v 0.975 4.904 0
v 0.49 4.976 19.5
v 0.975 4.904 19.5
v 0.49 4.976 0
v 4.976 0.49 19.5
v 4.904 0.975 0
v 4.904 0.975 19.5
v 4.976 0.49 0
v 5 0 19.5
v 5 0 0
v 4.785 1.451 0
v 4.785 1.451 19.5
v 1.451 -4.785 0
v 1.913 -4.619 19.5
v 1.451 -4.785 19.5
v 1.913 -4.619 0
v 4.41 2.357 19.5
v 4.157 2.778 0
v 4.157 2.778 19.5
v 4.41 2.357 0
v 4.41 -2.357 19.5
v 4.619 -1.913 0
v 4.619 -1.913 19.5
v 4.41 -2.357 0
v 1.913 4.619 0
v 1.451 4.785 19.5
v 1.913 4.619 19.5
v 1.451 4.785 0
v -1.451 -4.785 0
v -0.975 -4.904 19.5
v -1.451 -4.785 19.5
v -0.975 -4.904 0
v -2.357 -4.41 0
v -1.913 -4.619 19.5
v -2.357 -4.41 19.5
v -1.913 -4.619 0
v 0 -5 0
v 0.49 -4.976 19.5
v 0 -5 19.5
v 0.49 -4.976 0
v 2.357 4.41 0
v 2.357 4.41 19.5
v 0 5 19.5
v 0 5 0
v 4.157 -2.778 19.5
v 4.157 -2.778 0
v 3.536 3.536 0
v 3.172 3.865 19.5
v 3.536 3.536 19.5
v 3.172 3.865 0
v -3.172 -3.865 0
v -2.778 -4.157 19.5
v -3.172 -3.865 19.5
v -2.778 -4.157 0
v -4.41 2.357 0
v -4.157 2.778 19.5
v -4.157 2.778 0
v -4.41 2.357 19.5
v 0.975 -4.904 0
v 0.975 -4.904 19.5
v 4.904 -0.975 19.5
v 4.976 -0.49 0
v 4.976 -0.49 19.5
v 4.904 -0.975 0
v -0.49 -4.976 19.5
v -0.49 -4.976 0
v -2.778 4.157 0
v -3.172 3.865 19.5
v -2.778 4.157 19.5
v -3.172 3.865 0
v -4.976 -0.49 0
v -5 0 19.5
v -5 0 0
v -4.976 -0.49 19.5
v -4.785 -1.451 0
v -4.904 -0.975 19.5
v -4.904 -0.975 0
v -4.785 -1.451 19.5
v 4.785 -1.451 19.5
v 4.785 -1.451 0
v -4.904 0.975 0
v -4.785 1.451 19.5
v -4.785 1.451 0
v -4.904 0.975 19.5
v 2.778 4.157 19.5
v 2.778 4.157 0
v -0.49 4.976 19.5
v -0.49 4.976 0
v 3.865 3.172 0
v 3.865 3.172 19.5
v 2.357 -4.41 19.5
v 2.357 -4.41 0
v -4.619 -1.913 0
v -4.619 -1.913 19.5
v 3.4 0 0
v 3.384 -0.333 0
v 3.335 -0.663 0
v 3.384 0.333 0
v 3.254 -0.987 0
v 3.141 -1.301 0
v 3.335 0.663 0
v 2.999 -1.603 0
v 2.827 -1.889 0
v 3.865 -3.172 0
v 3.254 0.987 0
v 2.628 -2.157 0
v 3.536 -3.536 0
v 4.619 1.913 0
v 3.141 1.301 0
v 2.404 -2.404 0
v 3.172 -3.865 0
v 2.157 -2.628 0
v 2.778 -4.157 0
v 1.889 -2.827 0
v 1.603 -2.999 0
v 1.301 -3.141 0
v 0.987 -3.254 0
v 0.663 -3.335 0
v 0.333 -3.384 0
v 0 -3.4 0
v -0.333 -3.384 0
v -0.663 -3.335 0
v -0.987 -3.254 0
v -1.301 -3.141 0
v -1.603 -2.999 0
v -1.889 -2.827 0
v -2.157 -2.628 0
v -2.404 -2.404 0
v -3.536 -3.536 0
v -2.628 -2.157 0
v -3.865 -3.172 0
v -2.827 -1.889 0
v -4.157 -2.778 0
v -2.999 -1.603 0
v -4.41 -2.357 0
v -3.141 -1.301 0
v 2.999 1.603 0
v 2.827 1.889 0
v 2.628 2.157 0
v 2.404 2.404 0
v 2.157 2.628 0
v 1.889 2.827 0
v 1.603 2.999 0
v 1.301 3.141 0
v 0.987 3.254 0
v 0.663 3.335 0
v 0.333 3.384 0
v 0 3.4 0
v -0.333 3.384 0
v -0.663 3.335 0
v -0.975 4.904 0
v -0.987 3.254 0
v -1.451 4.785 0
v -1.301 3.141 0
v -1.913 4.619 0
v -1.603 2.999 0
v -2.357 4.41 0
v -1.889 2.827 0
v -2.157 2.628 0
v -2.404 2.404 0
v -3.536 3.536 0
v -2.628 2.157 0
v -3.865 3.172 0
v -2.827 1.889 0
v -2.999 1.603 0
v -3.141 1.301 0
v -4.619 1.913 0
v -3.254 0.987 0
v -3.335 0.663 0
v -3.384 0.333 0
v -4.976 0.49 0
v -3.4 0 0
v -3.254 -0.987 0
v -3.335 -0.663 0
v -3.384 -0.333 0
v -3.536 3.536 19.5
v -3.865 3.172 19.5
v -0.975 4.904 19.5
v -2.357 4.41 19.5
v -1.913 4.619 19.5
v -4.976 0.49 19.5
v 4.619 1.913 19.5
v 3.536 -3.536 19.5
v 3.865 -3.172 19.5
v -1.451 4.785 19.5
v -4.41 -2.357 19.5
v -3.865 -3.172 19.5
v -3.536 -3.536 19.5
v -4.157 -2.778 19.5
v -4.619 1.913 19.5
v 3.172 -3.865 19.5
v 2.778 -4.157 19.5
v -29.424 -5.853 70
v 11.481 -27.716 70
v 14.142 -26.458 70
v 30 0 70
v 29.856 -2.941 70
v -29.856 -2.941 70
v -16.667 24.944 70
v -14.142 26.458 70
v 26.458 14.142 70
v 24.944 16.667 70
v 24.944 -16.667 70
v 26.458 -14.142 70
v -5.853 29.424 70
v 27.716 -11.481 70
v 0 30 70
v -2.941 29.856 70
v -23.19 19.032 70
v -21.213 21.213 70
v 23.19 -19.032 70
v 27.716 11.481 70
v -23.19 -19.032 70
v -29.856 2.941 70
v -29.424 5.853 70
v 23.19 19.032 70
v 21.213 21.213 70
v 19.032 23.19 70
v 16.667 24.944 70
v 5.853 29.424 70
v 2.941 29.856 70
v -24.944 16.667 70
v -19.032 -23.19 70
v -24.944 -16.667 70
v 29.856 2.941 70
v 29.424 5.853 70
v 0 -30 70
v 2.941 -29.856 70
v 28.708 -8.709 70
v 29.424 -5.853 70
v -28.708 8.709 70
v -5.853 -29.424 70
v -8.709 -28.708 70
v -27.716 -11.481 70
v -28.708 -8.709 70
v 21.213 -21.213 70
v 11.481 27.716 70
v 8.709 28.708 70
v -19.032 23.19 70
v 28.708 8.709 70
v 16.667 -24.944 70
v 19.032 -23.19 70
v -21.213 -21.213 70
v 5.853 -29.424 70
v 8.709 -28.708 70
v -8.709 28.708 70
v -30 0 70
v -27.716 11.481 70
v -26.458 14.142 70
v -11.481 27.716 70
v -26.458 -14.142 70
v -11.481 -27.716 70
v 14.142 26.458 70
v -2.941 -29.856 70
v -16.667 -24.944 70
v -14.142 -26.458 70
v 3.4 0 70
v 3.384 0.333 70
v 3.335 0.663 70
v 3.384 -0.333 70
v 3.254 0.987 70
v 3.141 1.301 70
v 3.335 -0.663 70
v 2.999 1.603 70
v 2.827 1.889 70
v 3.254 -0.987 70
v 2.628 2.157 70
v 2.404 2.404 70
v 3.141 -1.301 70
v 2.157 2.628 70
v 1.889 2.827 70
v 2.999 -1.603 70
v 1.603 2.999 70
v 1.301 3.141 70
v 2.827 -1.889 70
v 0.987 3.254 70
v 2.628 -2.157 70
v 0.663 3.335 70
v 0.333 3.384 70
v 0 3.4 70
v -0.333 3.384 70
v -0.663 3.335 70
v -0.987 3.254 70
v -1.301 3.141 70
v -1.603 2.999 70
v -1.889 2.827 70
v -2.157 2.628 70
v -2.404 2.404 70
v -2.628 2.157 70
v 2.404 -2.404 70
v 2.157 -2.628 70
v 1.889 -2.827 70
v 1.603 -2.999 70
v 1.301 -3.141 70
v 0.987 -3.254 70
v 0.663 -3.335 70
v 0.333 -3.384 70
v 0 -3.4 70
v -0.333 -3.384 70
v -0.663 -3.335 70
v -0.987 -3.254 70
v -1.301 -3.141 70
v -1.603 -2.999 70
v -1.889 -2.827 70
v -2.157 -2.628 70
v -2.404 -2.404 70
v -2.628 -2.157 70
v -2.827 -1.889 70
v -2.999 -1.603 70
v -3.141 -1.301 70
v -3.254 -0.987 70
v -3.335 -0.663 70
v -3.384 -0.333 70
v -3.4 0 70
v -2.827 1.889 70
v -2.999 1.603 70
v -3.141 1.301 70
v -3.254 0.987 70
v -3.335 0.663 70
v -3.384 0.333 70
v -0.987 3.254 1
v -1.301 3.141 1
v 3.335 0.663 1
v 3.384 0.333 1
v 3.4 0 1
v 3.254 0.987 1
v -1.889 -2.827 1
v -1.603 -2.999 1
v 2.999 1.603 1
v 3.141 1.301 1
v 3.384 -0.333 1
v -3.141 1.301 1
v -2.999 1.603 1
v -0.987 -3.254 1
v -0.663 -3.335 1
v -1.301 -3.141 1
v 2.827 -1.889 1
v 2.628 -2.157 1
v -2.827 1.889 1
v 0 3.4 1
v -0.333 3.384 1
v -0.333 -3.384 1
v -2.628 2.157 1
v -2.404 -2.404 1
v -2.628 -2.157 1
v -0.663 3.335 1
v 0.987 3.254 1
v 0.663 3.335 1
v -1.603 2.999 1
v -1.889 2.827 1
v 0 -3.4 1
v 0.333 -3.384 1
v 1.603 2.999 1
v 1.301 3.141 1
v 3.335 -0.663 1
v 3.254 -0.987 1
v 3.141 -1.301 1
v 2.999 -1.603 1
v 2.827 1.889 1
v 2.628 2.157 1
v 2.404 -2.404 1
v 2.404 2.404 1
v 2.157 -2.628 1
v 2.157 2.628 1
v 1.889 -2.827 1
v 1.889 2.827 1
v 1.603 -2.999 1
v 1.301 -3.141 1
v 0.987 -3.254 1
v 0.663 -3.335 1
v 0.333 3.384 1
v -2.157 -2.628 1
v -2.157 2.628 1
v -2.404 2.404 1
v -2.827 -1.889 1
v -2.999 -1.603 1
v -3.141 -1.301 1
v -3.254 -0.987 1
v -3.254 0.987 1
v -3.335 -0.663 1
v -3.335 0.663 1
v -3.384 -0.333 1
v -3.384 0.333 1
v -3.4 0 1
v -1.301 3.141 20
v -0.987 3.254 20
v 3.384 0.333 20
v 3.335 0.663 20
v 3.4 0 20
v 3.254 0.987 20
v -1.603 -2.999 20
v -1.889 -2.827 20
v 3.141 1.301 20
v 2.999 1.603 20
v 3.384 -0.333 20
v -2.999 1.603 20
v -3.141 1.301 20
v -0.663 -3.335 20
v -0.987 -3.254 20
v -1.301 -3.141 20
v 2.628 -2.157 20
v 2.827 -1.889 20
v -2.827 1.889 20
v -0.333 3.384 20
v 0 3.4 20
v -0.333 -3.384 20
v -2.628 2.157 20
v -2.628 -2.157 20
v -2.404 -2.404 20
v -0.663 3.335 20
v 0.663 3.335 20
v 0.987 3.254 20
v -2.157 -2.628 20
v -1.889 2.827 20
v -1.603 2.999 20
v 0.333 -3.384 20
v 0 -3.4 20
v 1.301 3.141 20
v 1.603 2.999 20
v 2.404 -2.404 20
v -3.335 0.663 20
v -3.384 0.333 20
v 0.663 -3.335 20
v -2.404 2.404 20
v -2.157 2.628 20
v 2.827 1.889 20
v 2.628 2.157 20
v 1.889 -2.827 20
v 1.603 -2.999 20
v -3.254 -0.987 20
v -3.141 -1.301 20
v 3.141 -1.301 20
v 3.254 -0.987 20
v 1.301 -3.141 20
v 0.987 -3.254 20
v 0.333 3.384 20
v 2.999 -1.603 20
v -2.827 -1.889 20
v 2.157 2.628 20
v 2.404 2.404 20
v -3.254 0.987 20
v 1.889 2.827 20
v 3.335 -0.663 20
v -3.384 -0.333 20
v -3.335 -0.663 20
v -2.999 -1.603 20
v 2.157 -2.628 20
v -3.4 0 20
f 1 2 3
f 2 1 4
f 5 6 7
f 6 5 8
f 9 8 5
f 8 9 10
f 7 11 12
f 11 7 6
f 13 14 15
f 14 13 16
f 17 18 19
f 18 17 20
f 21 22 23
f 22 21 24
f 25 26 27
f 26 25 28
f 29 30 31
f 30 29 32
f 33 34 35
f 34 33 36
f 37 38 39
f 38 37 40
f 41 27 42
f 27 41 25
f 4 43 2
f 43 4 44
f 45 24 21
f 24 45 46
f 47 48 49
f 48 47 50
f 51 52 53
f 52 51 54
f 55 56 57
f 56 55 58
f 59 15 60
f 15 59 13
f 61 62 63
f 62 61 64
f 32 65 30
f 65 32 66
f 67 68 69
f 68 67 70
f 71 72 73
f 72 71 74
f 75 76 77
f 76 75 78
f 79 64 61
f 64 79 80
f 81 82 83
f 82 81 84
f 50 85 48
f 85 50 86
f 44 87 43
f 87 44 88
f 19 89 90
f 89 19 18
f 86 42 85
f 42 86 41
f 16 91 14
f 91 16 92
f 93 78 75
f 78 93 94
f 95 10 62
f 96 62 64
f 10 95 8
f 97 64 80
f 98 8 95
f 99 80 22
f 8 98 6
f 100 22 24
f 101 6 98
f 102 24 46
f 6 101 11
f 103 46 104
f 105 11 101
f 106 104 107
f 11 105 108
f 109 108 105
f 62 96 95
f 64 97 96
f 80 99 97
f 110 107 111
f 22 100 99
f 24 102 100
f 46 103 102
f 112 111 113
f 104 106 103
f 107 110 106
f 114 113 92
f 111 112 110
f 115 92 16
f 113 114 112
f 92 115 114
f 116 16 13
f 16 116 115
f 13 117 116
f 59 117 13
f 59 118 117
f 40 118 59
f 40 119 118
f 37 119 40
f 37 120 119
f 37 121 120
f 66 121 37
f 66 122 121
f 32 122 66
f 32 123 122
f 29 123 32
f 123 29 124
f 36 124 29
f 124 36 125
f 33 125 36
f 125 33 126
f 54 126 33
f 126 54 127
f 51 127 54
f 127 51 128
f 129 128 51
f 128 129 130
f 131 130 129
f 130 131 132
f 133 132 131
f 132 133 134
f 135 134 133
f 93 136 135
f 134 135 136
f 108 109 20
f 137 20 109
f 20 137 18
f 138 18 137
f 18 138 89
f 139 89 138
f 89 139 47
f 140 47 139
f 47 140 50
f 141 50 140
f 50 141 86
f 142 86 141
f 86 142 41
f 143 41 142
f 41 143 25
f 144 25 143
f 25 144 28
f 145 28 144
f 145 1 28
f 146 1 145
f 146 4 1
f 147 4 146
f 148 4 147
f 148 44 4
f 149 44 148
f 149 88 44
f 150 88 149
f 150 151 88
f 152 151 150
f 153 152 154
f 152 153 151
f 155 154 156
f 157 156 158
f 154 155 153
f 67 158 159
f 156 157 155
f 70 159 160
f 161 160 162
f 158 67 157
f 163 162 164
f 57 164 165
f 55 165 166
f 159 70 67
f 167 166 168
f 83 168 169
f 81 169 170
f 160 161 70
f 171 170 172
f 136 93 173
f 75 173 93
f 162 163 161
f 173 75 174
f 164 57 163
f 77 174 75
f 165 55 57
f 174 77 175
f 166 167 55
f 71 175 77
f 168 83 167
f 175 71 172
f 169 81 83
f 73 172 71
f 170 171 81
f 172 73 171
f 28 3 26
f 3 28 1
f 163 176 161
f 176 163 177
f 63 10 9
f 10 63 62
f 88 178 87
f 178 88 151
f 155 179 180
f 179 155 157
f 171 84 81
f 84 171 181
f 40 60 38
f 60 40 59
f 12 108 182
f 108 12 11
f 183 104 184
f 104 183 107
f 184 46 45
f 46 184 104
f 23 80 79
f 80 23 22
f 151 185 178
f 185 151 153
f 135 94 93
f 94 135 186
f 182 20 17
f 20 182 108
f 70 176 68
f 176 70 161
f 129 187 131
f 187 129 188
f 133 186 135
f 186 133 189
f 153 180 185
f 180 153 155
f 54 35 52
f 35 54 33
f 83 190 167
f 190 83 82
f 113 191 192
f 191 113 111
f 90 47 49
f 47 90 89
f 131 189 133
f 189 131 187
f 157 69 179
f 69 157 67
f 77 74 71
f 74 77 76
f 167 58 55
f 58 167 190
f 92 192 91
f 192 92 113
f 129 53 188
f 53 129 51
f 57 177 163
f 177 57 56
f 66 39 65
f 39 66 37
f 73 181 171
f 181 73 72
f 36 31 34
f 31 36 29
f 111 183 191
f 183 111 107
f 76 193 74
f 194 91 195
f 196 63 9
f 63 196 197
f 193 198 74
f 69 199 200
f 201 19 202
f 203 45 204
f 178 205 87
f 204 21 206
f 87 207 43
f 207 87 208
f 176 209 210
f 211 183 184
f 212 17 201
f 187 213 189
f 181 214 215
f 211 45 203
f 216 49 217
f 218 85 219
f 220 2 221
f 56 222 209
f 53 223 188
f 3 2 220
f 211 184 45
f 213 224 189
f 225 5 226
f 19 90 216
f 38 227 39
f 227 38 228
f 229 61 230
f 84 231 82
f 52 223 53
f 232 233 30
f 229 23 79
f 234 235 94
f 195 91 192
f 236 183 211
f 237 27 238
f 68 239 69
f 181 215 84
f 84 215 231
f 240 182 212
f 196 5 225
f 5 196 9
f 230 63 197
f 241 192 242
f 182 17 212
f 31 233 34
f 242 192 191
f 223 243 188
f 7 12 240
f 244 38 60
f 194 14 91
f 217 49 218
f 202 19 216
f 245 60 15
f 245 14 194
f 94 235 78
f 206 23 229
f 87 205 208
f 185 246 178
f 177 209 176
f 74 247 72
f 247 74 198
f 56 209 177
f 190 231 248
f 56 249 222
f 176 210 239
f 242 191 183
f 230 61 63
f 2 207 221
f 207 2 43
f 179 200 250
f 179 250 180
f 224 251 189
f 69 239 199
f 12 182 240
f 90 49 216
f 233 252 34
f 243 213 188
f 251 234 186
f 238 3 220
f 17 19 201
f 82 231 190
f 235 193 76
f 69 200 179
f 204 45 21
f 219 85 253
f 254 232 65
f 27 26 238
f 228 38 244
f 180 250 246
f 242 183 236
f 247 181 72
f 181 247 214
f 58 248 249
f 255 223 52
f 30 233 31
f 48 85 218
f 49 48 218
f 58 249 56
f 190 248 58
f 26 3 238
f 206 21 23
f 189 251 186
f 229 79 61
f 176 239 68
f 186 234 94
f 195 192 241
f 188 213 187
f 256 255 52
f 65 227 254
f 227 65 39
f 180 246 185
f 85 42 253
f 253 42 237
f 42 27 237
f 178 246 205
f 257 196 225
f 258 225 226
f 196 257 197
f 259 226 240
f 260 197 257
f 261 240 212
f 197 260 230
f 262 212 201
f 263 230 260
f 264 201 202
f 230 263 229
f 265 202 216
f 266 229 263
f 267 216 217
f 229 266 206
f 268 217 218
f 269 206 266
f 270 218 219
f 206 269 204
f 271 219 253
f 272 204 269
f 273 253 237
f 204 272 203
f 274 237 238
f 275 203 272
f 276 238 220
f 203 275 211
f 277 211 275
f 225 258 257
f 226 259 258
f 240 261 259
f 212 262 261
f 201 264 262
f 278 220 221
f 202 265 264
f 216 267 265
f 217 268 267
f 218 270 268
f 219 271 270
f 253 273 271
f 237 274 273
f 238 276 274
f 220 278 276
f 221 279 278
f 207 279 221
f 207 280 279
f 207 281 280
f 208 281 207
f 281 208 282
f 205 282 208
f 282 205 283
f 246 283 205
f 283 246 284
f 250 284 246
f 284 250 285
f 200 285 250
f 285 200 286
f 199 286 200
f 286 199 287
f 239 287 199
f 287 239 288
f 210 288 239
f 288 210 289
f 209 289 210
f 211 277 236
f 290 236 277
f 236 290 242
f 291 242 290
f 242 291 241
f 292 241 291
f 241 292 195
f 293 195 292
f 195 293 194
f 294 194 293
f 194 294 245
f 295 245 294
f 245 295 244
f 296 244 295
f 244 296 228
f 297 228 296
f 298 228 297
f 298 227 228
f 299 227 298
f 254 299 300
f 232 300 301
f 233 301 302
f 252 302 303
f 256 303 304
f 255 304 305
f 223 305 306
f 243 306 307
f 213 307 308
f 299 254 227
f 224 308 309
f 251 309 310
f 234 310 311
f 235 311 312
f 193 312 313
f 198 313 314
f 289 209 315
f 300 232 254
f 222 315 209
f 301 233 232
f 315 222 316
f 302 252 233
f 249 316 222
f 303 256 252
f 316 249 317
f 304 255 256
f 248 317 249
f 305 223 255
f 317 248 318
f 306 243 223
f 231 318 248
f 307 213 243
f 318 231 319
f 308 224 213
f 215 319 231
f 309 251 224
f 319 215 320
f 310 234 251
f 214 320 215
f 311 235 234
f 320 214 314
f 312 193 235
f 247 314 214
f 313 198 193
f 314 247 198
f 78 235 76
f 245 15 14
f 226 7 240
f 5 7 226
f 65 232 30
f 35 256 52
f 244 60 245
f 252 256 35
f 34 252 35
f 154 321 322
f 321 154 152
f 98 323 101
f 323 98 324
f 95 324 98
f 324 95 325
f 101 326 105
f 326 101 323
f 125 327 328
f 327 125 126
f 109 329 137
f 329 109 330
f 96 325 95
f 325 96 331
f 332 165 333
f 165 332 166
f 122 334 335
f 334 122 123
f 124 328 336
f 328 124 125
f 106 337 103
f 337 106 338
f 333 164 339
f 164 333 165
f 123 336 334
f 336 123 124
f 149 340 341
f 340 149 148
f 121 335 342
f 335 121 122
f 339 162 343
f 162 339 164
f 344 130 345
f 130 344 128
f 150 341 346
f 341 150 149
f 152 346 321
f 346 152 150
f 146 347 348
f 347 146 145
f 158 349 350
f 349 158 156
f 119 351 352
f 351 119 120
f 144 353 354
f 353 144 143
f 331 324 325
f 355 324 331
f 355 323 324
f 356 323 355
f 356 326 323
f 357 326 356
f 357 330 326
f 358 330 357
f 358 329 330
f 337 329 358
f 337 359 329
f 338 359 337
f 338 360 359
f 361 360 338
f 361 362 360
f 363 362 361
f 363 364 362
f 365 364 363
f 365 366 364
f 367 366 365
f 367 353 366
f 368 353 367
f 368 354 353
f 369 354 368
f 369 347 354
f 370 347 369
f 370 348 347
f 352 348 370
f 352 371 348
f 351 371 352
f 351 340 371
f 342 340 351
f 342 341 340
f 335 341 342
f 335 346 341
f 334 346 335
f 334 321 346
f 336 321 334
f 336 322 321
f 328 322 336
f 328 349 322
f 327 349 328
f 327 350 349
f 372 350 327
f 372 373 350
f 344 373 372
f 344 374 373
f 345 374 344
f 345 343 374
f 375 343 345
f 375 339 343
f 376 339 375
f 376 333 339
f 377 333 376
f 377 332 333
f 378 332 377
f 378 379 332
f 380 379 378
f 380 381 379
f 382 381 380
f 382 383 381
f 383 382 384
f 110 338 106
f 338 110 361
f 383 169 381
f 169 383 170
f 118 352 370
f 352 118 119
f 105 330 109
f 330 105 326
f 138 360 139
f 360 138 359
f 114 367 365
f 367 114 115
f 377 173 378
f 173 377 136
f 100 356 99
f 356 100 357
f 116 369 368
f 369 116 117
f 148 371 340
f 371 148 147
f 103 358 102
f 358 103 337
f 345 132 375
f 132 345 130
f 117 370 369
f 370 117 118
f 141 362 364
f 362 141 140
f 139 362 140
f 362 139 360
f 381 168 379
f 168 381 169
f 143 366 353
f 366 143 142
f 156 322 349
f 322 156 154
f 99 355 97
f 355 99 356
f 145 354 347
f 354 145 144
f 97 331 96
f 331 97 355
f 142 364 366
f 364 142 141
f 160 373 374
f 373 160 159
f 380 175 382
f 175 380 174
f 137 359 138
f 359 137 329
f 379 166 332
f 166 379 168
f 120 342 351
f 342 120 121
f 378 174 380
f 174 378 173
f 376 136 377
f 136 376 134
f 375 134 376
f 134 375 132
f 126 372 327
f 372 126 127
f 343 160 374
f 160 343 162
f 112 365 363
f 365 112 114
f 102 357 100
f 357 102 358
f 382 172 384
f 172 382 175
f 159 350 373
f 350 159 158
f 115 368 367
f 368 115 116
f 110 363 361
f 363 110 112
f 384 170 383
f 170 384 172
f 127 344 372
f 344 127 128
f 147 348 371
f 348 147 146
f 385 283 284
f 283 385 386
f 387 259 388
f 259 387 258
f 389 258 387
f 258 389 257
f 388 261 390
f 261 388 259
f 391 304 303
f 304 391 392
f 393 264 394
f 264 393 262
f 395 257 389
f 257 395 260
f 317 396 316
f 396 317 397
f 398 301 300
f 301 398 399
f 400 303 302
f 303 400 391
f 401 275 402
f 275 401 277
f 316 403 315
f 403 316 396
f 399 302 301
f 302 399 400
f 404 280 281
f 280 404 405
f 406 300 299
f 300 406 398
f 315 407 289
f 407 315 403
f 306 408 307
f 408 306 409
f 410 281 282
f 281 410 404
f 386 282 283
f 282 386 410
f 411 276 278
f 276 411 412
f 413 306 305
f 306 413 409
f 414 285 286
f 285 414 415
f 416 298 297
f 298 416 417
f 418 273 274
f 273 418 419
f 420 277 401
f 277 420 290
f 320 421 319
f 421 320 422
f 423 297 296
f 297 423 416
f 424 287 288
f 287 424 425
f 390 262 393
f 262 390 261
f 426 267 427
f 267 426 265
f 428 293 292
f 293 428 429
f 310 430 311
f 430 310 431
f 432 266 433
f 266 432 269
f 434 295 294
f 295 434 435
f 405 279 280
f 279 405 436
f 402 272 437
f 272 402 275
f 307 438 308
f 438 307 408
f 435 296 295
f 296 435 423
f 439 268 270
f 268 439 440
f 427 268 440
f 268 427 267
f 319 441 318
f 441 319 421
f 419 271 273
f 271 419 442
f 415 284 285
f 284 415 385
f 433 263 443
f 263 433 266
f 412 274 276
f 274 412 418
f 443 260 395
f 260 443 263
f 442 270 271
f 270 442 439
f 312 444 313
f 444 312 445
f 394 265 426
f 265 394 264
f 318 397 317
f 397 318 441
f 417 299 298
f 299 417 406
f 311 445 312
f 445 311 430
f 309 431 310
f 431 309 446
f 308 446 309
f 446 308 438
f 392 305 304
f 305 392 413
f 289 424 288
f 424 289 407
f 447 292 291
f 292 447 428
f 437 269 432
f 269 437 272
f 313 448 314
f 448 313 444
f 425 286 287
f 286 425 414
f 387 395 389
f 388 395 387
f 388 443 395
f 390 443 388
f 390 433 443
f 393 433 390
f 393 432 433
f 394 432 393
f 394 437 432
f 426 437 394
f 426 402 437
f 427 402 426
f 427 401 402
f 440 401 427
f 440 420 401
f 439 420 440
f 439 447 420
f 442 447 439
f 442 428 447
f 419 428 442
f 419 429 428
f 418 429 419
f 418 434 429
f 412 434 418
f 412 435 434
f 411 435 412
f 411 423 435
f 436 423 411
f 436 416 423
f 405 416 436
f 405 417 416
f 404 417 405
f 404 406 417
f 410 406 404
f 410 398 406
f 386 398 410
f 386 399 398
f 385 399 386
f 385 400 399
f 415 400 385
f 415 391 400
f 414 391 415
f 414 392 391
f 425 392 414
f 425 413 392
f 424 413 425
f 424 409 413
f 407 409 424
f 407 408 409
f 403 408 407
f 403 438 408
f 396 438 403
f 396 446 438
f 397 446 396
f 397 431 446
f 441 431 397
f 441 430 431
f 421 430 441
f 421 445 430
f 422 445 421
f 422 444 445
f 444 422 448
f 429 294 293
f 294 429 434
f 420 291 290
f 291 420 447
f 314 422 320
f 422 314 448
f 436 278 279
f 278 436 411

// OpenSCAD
// Lab funnel - printed upright with wide opening at the top
// Units: mm. Wall thickness 1.6 mm throughout.

$fn = 64;

// ---- Dimensions ----
spout_od        = 10;    // outer diameter of straight spout (z = 0..20)
spout_id        = spout_od - 2*1.6;  // bore diameter = 6.8 mm
spout_h         = 20;    // spout height (z = 0 to 20)

cone_bottom_od  = spout_od;  // cone starts at spout diameter (z = 20)
cone_top_od     = 60;    // cone rim diameter (z = 50)
cone_h          = cone_top_od - cone_bottom_od;  // 40 mm cone height

total_h         = spout_h + cone_h;  // 50 mm overall

eps             = 0.5;   // overlap for clean boolean cuts

// ---- Model ----
difference() {
    union() {
        // Spout
        cylinder(h = spout_h, d = spout_od);

        // Cone
        translate([0, 0, spout_h - eps])
            cylinder(h = cone_h + eps, d1 = cone_bottom_od, d2 = cone_top_od);
    }

    // Bottom cut (open bottom)
    translate([0, 0, -eps])
        cylinder(h = eps + 1, d = spout_id);

    // Wall thinning helper: extends above top rim, keeps full bore
    translate([0, 0, spout_h])
        cylinder(h = cone_h + eps + 1, d = spout_id);
}
